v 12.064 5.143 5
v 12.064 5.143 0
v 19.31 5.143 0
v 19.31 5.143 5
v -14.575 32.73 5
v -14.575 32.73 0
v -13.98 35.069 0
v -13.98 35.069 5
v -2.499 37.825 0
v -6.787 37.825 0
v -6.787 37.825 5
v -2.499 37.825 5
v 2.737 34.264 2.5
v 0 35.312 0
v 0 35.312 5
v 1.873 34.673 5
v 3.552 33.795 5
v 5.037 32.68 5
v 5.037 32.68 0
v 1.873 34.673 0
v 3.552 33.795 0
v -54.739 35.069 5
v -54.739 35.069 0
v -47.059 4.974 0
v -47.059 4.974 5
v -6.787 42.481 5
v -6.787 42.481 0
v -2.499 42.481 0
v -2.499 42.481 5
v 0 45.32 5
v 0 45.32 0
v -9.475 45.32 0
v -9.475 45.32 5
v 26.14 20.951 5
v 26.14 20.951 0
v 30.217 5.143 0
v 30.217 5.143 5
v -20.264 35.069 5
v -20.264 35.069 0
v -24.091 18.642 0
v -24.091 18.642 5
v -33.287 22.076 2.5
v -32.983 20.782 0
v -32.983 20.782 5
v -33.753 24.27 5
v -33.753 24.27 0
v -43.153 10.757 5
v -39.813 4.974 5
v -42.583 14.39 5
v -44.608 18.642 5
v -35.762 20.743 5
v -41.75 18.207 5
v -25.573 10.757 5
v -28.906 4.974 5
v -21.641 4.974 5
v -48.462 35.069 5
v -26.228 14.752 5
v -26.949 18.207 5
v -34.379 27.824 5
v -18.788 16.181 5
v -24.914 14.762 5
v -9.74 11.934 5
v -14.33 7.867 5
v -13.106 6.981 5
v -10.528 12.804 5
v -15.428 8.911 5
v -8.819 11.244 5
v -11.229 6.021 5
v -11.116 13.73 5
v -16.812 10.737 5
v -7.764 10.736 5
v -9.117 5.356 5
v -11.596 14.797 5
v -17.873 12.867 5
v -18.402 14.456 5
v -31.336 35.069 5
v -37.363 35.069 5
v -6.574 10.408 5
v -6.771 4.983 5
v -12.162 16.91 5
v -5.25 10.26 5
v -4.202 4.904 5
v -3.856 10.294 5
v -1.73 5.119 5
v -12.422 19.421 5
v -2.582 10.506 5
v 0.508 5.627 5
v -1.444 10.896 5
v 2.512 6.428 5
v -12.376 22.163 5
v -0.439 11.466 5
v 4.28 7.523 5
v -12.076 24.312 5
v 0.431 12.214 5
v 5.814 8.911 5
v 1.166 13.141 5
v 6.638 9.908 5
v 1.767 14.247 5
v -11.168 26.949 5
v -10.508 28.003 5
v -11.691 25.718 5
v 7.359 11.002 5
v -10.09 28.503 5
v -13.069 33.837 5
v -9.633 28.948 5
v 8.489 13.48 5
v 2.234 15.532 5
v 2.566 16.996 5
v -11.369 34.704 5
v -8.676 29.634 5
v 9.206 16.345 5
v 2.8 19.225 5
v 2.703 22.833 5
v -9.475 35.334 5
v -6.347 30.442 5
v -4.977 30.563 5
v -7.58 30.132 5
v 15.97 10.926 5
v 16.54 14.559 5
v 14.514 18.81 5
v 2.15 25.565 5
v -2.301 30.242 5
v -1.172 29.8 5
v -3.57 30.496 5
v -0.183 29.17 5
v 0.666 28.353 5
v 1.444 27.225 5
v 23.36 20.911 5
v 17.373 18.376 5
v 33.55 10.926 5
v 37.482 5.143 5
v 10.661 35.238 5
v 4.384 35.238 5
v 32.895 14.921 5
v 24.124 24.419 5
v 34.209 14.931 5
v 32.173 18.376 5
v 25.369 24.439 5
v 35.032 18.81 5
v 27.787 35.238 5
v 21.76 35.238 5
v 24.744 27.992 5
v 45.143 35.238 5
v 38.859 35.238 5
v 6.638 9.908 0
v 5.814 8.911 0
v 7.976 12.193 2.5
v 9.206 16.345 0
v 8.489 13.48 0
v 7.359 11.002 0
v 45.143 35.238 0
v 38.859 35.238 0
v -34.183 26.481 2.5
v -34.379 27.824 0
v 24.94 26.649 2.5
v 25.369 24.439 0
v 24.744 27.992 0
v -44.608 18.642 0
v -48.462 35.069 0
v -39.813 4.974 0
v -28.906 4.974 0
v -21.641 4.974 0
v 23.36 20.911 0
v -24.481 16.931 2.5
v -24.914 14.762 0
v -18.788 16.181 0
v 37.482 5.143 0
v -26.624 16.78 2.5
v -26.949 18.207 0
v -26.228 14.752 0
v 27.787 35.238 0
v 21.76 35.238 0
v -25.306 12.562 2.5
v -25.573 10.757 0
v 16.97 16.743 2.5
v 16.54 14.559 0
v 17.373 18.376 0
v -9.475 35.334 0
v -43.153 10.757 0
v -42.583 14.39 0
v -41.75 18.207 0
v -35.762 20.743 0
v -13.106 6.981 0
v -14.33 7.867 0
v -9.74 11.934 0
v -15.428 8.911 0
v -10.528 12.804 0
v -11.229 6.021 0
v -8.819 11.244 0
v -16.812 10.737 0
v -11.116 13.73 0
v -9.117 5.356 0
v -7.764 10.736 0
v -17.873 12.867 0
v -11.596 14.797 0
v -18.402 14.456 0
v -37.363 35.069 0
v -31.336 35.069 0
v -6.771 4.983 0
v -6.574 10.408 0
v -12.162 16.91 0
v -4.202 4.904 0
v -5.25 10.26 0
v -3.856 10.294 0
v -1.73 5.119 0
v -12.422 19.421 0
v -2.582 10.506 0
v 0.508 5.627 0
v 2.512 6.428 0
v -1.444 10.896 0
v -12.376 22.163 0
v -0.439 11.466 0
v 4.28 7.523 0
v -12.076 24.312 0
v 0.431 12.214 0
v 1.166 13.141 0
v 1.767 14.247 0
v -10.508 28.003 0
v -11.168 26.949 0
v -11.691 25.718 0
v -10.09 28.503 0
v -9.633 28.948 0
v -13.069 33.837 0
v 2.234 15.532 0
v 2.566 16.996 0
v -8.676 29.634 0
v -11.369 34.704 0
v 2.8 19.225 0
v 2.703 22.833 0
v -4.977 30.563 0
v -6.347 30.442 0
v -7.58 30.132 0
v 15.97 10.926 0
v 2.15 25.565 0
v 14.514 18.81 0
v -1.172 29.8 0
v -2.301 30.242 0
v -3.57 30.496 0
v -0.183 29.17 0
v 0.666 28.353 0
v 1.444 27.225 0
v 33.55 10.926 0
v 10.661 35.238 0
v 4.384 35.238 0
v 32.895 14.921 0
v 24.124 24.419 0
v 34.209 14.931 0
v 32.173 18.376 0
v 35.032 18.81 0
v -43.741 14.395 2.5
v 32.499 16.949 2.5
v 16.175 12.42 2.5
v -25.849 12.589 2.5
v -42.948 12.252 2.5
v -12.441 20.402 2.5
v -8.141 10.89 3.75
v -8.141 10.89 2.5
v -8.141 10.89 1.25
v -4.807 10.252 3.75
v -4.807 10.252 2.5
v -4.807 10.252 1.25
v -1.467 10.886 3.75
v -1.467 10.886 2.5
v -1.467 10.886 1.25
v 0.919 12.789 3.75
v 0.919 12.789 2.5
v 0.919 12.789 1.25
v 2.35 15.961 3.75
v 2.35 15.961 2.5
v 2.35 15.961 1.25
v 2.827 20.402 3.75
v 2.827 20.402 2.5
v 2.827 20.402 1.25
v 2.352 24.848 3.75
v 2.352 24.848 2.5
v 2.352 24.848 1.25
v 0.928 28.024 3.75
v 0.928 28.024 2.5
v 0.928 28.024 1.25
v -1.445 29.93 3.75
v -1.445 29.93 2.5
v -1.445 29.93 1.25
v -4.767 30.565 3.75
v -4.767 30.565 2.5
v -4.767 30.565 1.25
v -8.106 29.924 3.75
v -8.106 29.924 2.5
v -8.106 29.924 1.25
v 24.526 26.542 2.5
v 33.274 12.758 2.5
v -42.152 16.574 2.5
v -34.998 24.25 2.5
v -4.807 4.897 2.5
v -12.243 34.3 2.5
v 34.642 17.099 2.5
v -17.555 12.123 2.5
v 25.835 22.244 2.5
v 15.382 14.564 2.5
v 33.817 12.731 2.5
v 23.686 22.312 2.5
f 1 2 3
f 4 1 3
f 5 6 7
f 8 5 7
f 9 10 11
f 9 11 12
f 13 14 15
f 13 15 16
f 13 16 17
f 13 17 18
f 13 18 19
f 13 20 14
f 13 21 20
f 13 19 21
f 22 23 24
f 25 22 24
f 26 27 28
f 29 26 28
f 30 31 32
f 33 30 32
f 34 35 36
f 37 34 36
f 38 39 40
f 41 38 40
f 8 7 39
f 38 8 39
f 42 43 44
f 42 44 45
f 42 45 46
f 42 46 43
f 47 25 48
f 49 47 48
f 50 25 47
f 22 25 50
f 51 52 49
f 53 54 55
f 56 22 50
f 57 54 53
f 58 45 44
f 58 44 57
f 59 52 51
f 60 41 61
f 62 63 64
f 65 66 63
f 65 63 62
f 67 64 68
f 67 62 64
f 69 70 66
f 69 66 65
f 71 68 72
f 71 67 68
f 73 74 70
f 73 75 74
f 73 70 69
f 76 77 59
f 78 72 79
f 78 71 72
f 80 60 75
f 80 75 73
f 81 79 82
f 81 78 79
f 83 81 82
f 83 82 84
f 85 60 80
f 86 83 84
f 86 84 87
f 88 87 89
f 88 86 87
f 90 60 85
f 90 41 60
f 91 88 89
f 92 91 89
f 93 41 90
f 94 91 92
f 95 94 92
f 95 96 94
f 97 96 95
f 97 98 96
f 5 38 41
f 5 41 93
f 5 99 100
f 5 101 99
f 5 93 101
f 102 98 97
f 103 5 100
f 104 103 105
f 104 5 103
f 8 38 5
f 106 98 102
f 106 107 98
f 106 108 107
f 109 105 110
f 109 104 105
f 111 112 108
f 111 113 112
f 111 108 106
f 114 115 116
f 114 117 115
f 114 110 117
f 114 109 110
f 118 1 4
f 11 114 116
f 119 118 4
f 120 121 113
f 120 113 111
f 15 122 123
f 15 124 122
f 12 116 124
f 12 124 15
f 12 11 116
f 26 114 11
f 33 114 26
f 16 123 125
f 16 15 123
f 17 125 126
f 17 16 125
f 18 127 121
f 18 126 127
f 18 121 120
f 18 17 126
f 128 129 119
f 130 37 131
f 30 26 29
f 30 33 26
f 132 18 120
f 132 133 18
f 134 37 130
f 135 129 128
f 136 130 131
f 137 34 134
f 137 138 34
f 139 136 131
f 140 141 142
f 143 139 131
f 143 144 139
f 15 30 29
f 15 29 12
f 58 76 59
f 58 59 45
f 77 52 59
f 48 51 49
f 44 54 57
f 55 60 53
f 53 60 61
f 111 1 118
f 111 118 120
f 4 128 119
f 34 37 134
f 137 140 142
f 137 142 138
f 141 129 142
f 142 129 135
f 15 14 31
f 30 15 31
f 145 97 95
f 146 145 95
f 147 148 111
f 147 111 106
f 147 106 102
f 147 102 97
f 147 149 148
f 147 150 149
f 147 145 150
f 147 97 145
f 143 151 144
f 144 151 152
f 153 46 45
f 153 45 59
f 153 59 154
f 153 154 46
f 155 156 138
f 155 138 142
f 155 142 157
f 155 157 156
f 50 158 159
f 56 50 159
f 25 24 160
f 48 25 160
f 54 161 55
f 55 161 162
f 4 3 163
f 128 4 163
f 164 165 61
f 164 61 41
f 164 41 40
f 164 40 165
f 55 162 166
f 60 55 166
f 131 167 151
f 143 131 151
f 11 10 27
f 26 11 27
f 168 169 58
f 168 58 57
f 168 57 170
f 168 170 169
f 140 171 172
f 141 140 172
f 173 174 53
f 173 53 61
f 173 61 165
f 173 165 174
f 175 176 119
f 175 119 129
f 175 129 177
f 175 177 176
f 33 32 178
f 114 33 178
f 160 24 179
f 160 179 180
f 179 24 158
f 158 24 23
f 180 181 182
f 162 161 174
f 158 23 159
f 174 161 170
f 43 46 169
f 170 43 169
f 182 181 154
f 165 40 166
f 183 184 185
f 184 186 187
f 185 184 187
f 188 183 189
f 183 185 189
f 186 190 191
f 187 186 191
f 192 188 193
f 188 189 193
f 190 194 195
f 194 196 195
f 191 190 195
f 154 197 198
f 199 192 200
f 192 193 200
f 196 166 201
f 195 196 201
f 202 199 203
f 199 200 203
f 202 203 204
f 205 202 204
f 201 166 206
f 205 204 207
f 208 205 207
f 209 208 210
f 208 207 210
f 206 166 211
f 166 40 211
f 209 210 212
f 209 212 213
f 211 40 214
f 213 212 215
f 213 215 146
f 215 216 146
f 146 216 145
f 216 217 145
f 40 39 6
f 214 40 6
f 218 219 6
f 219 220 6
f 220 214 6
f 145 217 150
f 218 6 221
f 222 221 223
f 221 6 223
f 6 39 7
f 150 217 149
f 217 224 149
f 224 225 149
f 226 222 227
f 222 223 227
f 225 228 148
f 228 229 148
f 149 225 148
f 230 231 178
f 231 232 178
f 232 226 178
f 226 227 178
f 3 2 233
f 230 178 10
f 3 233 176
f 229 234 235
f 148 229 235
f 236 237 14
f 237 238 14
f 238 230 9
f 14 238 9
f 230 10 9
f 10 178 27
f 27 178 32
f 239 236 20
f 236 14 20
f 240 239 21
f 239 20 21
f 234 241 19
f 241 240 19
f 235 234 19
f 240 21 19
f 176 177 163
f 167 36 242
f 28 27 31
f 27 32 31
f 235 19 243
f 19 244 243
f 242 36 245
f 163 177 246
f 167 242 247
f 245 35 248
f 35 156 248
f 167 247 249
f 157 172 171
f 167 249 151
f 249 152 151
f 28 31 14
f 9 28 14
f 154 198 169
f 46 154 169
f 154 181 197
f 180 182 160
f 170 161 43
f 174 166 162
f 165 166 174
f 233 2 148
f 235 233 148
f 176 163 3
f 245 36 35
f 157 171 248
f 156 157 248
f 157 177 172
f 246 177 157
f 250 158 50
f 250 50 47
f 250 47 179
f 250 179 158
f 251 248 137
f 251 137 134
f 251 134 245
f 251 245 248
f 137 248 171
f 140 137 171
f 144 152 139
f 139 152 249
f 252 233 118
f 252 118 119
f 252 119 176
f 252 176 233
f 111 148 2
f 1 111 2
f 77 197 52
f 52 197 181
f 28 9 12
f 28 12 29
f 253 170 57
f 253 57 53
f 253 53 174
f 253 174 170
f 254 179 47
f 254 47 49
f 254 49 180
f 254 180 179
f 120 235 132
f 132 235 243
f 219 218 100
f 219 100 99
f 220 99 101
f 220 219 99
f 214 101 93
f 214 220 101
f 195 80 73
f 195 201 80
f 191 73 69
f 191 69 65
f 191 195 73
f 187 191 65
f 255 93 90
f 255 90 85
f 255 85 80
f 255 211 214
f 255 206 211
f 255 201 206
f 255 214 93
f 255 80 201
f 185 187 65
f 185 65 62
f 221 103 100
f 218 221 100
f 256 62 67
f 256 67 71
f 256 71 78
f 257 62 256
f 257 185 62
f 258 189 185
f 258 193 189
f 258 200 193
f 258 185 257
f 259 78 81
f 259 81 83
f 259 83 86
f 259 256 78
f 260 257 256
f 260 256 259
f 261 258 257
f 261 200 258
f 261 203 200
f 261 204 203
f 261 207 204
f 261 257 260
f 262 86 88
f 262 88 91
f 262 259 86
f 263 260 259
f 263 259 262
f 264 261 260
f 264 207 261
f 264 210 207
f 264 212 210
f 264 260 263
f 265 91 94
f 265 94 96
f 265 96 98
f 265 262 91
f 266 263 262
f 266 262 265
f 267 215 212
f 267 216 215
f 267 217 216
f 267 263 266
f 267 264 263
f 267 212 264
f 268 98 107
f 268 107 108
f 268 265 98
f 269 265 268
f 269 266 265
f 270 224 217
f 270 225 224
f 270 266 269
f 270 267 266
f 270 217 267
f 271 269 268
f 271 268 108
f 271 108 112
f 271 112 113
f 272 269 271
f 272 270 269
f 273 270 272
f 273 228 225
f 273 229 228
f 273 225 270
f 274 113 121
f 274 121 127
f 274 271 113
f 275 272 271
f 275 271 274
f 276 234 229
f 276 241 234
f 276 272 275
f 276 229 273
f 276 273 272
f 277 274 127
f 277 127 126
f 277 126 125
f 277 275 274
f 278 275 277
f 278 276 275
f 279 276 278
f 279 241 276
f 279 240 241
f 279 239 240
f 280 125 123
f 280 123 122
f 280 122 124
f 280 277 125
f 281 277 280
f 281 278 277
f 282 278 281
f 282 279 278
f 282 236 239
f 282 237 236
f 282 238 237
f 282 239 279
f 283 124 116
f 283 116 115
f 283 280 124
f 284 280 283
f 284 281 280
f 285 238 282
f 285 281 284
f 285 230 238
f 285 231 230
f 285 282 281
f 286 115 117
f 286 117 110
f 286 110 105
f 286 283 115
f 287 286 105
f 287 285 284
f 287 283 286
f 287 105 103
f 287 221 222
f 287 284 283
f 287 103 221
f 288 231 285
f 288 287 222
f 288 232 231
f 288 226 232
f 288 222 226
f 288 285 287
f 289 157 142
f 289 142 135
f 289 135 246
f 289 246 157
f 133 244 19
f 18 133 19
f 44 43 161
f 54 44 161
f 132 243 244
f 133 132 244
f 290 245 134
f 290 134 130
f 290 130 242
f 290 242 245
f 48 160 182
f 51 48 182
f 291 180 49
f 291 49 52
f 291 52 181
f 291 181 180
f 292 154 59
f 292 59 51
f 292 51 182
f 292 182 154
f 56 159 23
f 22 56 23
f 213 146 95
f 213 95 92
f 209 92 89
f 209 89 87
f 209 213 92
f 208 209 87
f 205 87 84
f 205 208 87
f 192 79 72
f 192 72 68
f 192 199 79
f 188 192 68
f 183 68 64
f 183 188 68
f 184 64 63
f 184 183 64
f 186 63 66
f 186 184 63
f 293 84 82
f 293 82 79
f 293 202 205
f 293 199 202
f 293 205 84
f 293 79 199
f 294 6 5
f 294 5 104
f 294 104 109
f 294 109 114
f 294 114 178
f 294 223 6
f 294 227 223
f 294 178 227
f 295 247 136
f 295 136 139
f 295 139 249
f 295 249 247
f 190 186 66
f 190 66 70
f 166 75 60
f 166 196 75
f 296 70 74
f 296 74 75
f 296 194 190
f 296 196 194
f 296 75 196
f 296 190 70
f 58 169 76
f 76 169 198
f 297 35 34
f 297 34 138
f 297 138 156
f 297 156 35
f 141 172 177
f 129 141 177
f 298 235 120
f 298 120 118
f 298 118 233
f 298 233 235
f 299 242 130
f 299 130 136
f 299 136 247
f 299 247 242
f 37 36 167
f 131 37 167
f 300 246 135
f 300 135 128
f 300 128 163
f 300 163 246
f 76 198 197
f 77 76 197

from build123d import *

# Parameters (mm, degrees)
F0_W     = 4.2884426657
F0_H     = 4.6554207802
F1_DEPTH = 5


with BuildPart() as f1:
    # F0 (on Top) → F1 (new body)
    with BuildSketch(Plane.XY):
        with BuildLine():
            Line((0, 34.1648682952), (-9.4748642296, 34.101113677))
            Line((-9.4748642296, 34.101113677), (-9.4748642296, 35.3339686341))
            add(Edge.make_bspline(
                [(-14.5754463948, 32.7304336343), (-12.461096702, 34.5684357885), (-9.4748642296, 35.3339686341)],
                knots=[0.1083350146, 0.1083350146, 0.1083350146, 0.628619133, 0.628619133, 0.628619133], degree=2))
            Line((-14.5754463948, 32.7304336343), (-18.7880718964, 16.1805747203))
            add(Edge.make_bspline(
                [(-15.428036076, 8.9111522718), (-18.0024923275, 11.7007186457), (-18.7880718964, 16.1805747203)],
                knots=[0, 0, 0, 0.6948561202, 0.6948561202, 0.6948561202], degree=2))
            add(Edge.make_bspline(
                [(-4.8069769728, 4.8965565984), (-11.7230154586, 4.8965565984), (-15.428036076, 8.9111522718)],
                knots=[0, 0, 0, 1, 1, 1], degree=2))
            add(Edge.make_bspline(
                [(5.8140821305, 8.9111522718), (2.1090615131, 4.8965565984), (-4.8069769728, 4.8965565984)],
                knots=[0, 0, 0, 1, 1, 1], degree=2))
            add(Edge.make_bspline(
                [(9.2055165337, 16.3447369284), (8.4412143544, 11.7577959882), (5.8140821305, 8.9111522718)],
                knots=[0.2909264225, 0.2909264225, 0.2909264225, 1, 1, 1], degree=2))
            Line((9.2055165337, 16.3447369284), (5.0368892491, 32.6796066227))
            add(Edge.make_bspline(
                [(0, 35.3122932316), (2.9558799099, 34.5319186151), (5.0368892491, 32.6796066227)],
                knots=[0.377110803, 0.377110803, 0.377110803, 0.8951173554, 0.8951173554, 0.8951173554], degree=2))
            Line((0, 35.3122932316), (0, 34.1648682952))
        make_face()
        with BuildLine():
            add(Edge.make_bspline(
                [(-12.4409661205, 20.4016562133), (-12.4409661205, 15.3562414703), (-10.5275288061, 12.8038939339)],
                knots=[0, 0, 0, 1, 1, 1], degree=2))
            add(Edge.make_bspline(
                [(-10.5077686961, 28.0027118444), (-12.4409661205, 25.440484253), (-12.4409661205, 20.4016562133)],
                knots=[0, 0, 0, 1, 1, 1], degree=2))
            add(Edge.make_bspline(
                [(-4.7674567528, 30.5649394359), (-8.5745712717, 30.5649394359), (-10.5077686961, 28.0027118444)],
                knots=[0, 0, 0, 1, 1, 1], degree=2))
            add(Edge.make_bspline(
                [(2.827012175, 20.4016562133), (2.827012175, 30.5649394359), (-4.7674567528, 30.5649394359)],
                knots=[0, 0, 0, 1, 1, 1], degree=2))
            add(Edge.make_bspline(
                [(-4.8069769728, 10.2515463974), (2.827012175, 10.2515463974), (2.827012175, 20.4016562133)],
                knots=[0, 0, 0, 1, 1, 1], degree=2))
            add(Edge.make_bspline(
                [(-10.5275288061, 12.8038939339), (-8.6140914916, 10.2515463974), (-4.8069769728, 10.2515463974)],
                knots=[0, 0, 0, 1, 1, 1], degree=2))
        make_face(mode=Mode.SUBTRACT)
        with BuildLine():
            Line((-9.4748642296, 35.3339686341), (-9.4748642296, 34.101113677))
            Line((-9.4748642296, 34.101113677), (0, 34.1648682952))
            Line((0, 34.1648682952), (0, 35.3122932316))
            add(Edge.make_bspline(
                [(-4.7674567528, 35.880409015), (-2.1518921746, 35.880409015), (0, 35.3122932316)],
                knots=[0, 0, 0, 0.377110803, 0.377110803, 0.377110803], degree=2))
            add(Edge.make_bspline(
                [(-9.4748642296, 35.3339686341), (-7.3432796485, 35.880409015), (-4.7674567528, 35.880409015)],
                knots=[0.628619133, 0.628619133, 0.628619133, 1, 1, 1], degree=2))
        make_face()
        with BuildLine():
            Line((-9.4748642296, 45.3200861812), (-9.4748642296, 35.3339686341))
            add(Edge.make_bspline(
                [(-9.4748642296, 35.3339686341), (-7.3432796485, 35.880409015), (-4.7674567528, 35.880409015)],
                knots=[0.628619133, 0.628619133, 0.628619133, 1, 1, 1], degree=2))
            add(Edge.make_bspline(
                [(-4.7674567528, 35.880409015), (-2.1518921746, 35.880409015), (0, 35.3122932316)],
                knots=[0, 0, 0, 0.377110803, 0.377110803, 0.377110803], degree=2))
            Line((0, 35.3122932316), (0, 45.3200861812))
            Line((0, 45.3200861812), (-9.4748642296, 45.3200861812))
        make_face()
        with Locations((-4.6429432696, 40.1529334486)):
            Rectangle(F0_W, F0_H, mode=Mode.SUBTRACT)
        with BuildLine():
            add(Edge.make_bspline(
                [(-15.418156021, 31.9185069681), (-15.0157022025, 32.3477196841), (-14.5754463948, 32.7304336343)],
                knots=[0, 0, 0, 0.1083350146, 0.1083350146, 0.1083350146], degree=2))
            Line((-14.5754463948, 32.7304336343), (-13.9802033126, 35.0689251585))
            Line((-13.9802033126, 35.0689251585), (-20.2639182798, 35.0689251585))
            Line((-20.2639182798, 35.0689251585), (-24.0907929086, 18.6416870787))
            add(Edge.make_bspline(
                [(-24.9141308236, 14.7621188234), (-24.4596482945, 17.1596788318), (-24.0907929086, 18.6416870787)],
                knots=[0, 0, 0, 1, 1, 1], degree=2))
            add(Edge.make_bspline(
                [(-25.5728011556, 10.7574032049), (-25.3686133526, 12.3645588149), (-24.9141308236, 14.7621188234)],
                knots=[0, 0, 0, 1, 1, 1], degree=2))
            add(Edge.make_bspline(
                [(-26.2281781359, 14.7522387684), (-25.7967490684, 12.4238391448), (-25.5728011556, 10.7574032049)],
                knots=[0, 0, 0, 1, 1, 1], degree=2))
            add(Edge.make_bspline(
                [(-26.9494221494, 18.2069646596), (-26.6596072033, 17.0806383919), (-26.2281781359, 14.7522387684)],
                knots=[0, 0, 0, 1, 1, 1], degree=2))
            Line((-26.9494221494, 18.2069646596), (-31.3361665604, 35.0689251585))
            Line((-31.3361665604, 35.0689251585), (-37.3630000981, 35.0689251585))
            Line((-37.3630000981, 35.0689251585), (-41.7497445091, 18.2069646596))
            add(Edge.make_bspline(
                [(-42.5829624791, 14.3899700858), (-42.138360005, 16.8501037757), (-41.7497445091, 18.2069646596)],
                knots=[0, 0, 0, 1, 1, 1], degree=2))
            add(Edge.make_bspline(
                [(-43.1527123162, 10.7574032049), (-43.0275649532, 11.9298363958), (-42.5829624791, 14.3899700858)],
                knots=[0, 0, 0, 1, 1, 1], degree=2))
            add(Edge.make_bspline(
                [(-44.6083737499, 18.6416870787), (-43.600608142, 14.0902750847), (-43.1527123162, 10.7574032049)],
                knots=[0, 0, 0, 1, 1, 1], degree=2))
            Line((-44.6083737499, 18.6416870787), (-48.461595192, 35.0689251585))
            Line((-48.461595192, 35.0689251585), (-54.7387234559, 35.0689251585))
            Line((-54.7387234559, 35.0689251585), (-47.0586273849, 4.9742776901))
            Line((-47.0586273849, 4.9742776901), (-39.8132537331, 4.9742776901))
            Line((-39.8132537331, 4.9742776901), (-35.7624311914, 20.7428454378))
            add(Edge.make_bspline(
                [(-34.9983736063, 24.2502649556), (-35.4923763553, 21.7901312656), (-35.7624311914, 20.7428454378)],
                knots=[0, 0, 0, 1, 1, 1], degree=2))
            add(Edge.make_bspline(
                [(-34.3792234942, 27.8235515066), (-34.5043708573, 26.7103986456), (-34.9983736063, 24.2502649556)],
                knots=[0, 0, 0, 1, 1, 1], degree=2))
            add(Edge.make_bspline(
                [(-33.7534866788, 24.2700250656), (-34.3001830544, 26.9145864485), (-34.3792234942, 27.8235515066)],
                knots=[0, 0, 0, 1, 1, 1], degree=2))
            add(Edge.make_bspline(
                [(-32.9828423904, 20.7823656577), (-33.2067903033, 21.6254636826), (-33.7534866788, 24.2700250656)],
                knots=[0, 0, 0, 1, 1, 1], degree=2))
            Line((-32.9828423904, 20.7823656577), (-28.9056730354, 4.9742776901))
            Line((-28.9056730354, 4.9742776901), (-21.6405392736, 4.9742776901))
            Line((-21.6405392736, 4.9742776901), (-18.7880718964, 16.1805747203))
            add(Edge.make_bspline(
                [(-18.7880718964, 16.1805747203), (-19.1330566934, 18.147889426), (-19.1330566934, 20.4411764332)],
                knots=[0.6948561202, 0.6948561202, 0.6948561202, 1, 1, 1], degree=2))
            add(Edge.make_bspline(
                [(-19.1330566934, 20.4411764332), (-19.1330566934, 27.9566049212), (-15.418156021, 31.9185069681)],
                knots=[0, 0, 0, 1, 1, 1], degree=2))
        make_face()
        with BuildLine():
            Line((-18.7880718964, 16.1805747203), (-14.5754463948, 32.7304336343))
            add(Edge.make_bspline(
                [(-15.418156021, 31.9185069681), (-15.0157022025, 32.3477196841), (-14.5754463948, 32.7304336343)],
                knots=[0, 0, 0, 0.1083350146, 0.1083350146, 0.1083350146], degree=2))
            add(Edge.make_bspline(
                [(-19.1330566934, 20.4411764332), (-19.1330566934, 27.9566049212), (-15.418156021, 31.9185069681)],
                knots=[0, 0, 0, 1, 1, 1], degree=2))
            add(Edge.make_bspline(
                [(-18.7880718964, 16.1805747203), (-19.1330566934, 18.147889426), (-19.1330566934, 20.4411764332)],
                knots=[0.6948561202, 0.6948561202, 0.6948561202, 1, 1, 1], degree=2))
        make_face()
        with BuildLine():
            Line((4.3841088191, 35.2375429732), (5.0368892491, 32.6796066227))
            add(Edge.make_bspline(
                [(5.0368892491, 32.6796066227), (5.4582386738, 32.30456237), (5.8437222954, 31.8855734515)],
                knots=[0.8951173554, 0.8951173554, 0.8951173554, 1, 1, 1], degree=2))
            add(Edge.make_bspline(
                [(5.8437222954, 31.8855734515), (9.5191027479, 27.890737888), (9.5191027479, 20.4016562133)],
                knots=[0, 0, 0, 1, 1, 1], degree=2))
            add(Edge.make_bspline(
                [(9.5191027479, 20.4016562133), (9.5191027479, 18.2267169659), (9.2055165337, 16.3447369284)],
                knots=[0, 0, 0, 0.2909264225, 0.2909264225, 0.2909264225], degree=2))
            Line((9.2055165337, 16.3447369284), (12.06420489, 5.1428955048))
            Line((12.06420489, 5.1428955048), (19.3095785419, 5.1428955048))
            Line((19.3095785419, 5.1428955048), (23.3604010836, 20.9114632526))
            add(Edge.make_bspline(
                [(24.1244586687, 24.4188827704), (23.6304559197, 21.9587490804), (23.3604010836, 20.9114632526)],
                knots=[0, 0, 0, 1, 1, 1], degree=2))
            add(Edge.make_bspline(
                [(24.7436087807, 27.9921693214), (24.6184614177, 26.8790164603), (24.1244586687, 24.4188827704)],
                knots=[0, 0, 0, 1, 1, 1], degree=2))
            add(Edge.make_bspline(
                [(25.3693455961, 24.4386428803), (24.8226492206, 27.0832042633), (24.7436087807, 27.9921693214)],
                knots=[0, 0, 0, 1, 1, 1], degree=2))
            add(Edge.make_bspline(
                [(26.1399898845, 20.9509834725), (25.9160419717, 21.7940814974), (25.3693455961, 24.4386428803)],
                knots=[0, 0, 0, 1, 1, 1], degree=2))
            Line((26.1399898845, 20.9509834725), (30.2171592395, 5.1428955048))
            Line((30.2171592395, 5.1428955048), (37.4822930013, 5.1428955048))
            Line((37.4822930013, 5.1428955048), (45.1426289623, 35.2375429732))
            Line((45.1426289623, 35.2375429732), (38.8589139952, 35.2375429732))
            Line((38.8589139952, 35.2375429732), (35.0320393663, 18.8103048935))
            add(Edge.make_bspline(
                [(34.2087014514, 14.9307366381), (34.6631839804, 17.3282966466), (35.0320393663, 18.8103048935)],
                knots=[0, 0, 0, 1, 1, 1], degree=2))
            add(Edge.make_bspline(
                [(33.5500311194, 10.9260210197), (33.7542189223, 12.5331766297), (34.2087014514, 14.9307366381)],
                knots=[0, 0, 0, 1, 1, 1], degree=2))
            add(Edge.make_bspline(
                [(32.8946541391, 14.9208565832), (33.3260832065, 12.5924569596), (33.5500311194, 10.9260210197)],
                knots=[0, 0, 0, 1, 1, 1], degree=2))
            add(Edge.make_bspline(
                [(32.1734101255, 18.3755824744), (32.4632250716, 17.2492562067), (32.8946541391, 14.9208565832)],
                knots=[0, 0, 0, 1, 1, 1], degree=2))
            Line((32.1734101255, 18.3755824744), (27.7866657145, 35.2375429732))
            Line((27.7866657145, 35.2375429732), (21.7598321768, 35.2375429732))
            Line((21.7598321768, 35.2375429732), (17.3730877658, 18.3755824744))
            add(Edge.make_bspline(
                [(16.5398697959, 14.5585879006), (16.9844722699, 17.0187215905), (17.3730877658, 18.3755824744)],
                knots=[0, 0, 0, 1, 1, 1], degree=2))
            add(Edge.make_bspline(
                [(15.9701199587, 10.9260210197), (16.0952673218, 12.0984542106), (16.5398697959, 14.5585879006)],
                knots=[0, 0, 0, 1, 1, 1], degree=2))
            add(Edge.make_bspline(
                [(14.514458525, 18.8103048935), (15.5222241329, 14.2588928995), (15.9701199587, 10.9260210197)],
                knots=[0, 0, 0, 1, 1, 1], degree=2))
            Line((14.514458525, 18.8103048935), (10.6612370829, 35.2375429732))
            Line((10.6612370829, 35.2375429732), (4.3841088191, 35.2375429732))
        make_face()
        with BuildLine():
            add(Edge.make_bspline(
                [(5.0368892491, 32.6796066227), (5.4582386738, 32.30456237), (5.8437222954, 31.8855734515)],
                knots=[0.8951173554, 0.8951173554, 0.8951173554, 1, 1, 1], degree=2))
            Line((5.0368892491, 32.6796066227), (9.2055165337, 16.3447369284))
            add(Edge.make_bspline(
                [(9.5191027479, 20.4016562133), (9.5191027479, 18.2267169659), (9.2055165337, 16.3447369284)],
                knots=[0, 0, 0, 0.2909264225, 0.2909264225, 0.2909264225], degree=2))
            add(Edge.make_bspline(
                [(5.8437222954, 31.8855734515), (9.5191027479, 27.890737888), (9.5191027479, 20.4016562133)],
                knots=[0, 0, 0, 1, 1, 1], degree=2))
        make_face()
    extrude(amount=F1_DEPTH)


solid = f1.part
